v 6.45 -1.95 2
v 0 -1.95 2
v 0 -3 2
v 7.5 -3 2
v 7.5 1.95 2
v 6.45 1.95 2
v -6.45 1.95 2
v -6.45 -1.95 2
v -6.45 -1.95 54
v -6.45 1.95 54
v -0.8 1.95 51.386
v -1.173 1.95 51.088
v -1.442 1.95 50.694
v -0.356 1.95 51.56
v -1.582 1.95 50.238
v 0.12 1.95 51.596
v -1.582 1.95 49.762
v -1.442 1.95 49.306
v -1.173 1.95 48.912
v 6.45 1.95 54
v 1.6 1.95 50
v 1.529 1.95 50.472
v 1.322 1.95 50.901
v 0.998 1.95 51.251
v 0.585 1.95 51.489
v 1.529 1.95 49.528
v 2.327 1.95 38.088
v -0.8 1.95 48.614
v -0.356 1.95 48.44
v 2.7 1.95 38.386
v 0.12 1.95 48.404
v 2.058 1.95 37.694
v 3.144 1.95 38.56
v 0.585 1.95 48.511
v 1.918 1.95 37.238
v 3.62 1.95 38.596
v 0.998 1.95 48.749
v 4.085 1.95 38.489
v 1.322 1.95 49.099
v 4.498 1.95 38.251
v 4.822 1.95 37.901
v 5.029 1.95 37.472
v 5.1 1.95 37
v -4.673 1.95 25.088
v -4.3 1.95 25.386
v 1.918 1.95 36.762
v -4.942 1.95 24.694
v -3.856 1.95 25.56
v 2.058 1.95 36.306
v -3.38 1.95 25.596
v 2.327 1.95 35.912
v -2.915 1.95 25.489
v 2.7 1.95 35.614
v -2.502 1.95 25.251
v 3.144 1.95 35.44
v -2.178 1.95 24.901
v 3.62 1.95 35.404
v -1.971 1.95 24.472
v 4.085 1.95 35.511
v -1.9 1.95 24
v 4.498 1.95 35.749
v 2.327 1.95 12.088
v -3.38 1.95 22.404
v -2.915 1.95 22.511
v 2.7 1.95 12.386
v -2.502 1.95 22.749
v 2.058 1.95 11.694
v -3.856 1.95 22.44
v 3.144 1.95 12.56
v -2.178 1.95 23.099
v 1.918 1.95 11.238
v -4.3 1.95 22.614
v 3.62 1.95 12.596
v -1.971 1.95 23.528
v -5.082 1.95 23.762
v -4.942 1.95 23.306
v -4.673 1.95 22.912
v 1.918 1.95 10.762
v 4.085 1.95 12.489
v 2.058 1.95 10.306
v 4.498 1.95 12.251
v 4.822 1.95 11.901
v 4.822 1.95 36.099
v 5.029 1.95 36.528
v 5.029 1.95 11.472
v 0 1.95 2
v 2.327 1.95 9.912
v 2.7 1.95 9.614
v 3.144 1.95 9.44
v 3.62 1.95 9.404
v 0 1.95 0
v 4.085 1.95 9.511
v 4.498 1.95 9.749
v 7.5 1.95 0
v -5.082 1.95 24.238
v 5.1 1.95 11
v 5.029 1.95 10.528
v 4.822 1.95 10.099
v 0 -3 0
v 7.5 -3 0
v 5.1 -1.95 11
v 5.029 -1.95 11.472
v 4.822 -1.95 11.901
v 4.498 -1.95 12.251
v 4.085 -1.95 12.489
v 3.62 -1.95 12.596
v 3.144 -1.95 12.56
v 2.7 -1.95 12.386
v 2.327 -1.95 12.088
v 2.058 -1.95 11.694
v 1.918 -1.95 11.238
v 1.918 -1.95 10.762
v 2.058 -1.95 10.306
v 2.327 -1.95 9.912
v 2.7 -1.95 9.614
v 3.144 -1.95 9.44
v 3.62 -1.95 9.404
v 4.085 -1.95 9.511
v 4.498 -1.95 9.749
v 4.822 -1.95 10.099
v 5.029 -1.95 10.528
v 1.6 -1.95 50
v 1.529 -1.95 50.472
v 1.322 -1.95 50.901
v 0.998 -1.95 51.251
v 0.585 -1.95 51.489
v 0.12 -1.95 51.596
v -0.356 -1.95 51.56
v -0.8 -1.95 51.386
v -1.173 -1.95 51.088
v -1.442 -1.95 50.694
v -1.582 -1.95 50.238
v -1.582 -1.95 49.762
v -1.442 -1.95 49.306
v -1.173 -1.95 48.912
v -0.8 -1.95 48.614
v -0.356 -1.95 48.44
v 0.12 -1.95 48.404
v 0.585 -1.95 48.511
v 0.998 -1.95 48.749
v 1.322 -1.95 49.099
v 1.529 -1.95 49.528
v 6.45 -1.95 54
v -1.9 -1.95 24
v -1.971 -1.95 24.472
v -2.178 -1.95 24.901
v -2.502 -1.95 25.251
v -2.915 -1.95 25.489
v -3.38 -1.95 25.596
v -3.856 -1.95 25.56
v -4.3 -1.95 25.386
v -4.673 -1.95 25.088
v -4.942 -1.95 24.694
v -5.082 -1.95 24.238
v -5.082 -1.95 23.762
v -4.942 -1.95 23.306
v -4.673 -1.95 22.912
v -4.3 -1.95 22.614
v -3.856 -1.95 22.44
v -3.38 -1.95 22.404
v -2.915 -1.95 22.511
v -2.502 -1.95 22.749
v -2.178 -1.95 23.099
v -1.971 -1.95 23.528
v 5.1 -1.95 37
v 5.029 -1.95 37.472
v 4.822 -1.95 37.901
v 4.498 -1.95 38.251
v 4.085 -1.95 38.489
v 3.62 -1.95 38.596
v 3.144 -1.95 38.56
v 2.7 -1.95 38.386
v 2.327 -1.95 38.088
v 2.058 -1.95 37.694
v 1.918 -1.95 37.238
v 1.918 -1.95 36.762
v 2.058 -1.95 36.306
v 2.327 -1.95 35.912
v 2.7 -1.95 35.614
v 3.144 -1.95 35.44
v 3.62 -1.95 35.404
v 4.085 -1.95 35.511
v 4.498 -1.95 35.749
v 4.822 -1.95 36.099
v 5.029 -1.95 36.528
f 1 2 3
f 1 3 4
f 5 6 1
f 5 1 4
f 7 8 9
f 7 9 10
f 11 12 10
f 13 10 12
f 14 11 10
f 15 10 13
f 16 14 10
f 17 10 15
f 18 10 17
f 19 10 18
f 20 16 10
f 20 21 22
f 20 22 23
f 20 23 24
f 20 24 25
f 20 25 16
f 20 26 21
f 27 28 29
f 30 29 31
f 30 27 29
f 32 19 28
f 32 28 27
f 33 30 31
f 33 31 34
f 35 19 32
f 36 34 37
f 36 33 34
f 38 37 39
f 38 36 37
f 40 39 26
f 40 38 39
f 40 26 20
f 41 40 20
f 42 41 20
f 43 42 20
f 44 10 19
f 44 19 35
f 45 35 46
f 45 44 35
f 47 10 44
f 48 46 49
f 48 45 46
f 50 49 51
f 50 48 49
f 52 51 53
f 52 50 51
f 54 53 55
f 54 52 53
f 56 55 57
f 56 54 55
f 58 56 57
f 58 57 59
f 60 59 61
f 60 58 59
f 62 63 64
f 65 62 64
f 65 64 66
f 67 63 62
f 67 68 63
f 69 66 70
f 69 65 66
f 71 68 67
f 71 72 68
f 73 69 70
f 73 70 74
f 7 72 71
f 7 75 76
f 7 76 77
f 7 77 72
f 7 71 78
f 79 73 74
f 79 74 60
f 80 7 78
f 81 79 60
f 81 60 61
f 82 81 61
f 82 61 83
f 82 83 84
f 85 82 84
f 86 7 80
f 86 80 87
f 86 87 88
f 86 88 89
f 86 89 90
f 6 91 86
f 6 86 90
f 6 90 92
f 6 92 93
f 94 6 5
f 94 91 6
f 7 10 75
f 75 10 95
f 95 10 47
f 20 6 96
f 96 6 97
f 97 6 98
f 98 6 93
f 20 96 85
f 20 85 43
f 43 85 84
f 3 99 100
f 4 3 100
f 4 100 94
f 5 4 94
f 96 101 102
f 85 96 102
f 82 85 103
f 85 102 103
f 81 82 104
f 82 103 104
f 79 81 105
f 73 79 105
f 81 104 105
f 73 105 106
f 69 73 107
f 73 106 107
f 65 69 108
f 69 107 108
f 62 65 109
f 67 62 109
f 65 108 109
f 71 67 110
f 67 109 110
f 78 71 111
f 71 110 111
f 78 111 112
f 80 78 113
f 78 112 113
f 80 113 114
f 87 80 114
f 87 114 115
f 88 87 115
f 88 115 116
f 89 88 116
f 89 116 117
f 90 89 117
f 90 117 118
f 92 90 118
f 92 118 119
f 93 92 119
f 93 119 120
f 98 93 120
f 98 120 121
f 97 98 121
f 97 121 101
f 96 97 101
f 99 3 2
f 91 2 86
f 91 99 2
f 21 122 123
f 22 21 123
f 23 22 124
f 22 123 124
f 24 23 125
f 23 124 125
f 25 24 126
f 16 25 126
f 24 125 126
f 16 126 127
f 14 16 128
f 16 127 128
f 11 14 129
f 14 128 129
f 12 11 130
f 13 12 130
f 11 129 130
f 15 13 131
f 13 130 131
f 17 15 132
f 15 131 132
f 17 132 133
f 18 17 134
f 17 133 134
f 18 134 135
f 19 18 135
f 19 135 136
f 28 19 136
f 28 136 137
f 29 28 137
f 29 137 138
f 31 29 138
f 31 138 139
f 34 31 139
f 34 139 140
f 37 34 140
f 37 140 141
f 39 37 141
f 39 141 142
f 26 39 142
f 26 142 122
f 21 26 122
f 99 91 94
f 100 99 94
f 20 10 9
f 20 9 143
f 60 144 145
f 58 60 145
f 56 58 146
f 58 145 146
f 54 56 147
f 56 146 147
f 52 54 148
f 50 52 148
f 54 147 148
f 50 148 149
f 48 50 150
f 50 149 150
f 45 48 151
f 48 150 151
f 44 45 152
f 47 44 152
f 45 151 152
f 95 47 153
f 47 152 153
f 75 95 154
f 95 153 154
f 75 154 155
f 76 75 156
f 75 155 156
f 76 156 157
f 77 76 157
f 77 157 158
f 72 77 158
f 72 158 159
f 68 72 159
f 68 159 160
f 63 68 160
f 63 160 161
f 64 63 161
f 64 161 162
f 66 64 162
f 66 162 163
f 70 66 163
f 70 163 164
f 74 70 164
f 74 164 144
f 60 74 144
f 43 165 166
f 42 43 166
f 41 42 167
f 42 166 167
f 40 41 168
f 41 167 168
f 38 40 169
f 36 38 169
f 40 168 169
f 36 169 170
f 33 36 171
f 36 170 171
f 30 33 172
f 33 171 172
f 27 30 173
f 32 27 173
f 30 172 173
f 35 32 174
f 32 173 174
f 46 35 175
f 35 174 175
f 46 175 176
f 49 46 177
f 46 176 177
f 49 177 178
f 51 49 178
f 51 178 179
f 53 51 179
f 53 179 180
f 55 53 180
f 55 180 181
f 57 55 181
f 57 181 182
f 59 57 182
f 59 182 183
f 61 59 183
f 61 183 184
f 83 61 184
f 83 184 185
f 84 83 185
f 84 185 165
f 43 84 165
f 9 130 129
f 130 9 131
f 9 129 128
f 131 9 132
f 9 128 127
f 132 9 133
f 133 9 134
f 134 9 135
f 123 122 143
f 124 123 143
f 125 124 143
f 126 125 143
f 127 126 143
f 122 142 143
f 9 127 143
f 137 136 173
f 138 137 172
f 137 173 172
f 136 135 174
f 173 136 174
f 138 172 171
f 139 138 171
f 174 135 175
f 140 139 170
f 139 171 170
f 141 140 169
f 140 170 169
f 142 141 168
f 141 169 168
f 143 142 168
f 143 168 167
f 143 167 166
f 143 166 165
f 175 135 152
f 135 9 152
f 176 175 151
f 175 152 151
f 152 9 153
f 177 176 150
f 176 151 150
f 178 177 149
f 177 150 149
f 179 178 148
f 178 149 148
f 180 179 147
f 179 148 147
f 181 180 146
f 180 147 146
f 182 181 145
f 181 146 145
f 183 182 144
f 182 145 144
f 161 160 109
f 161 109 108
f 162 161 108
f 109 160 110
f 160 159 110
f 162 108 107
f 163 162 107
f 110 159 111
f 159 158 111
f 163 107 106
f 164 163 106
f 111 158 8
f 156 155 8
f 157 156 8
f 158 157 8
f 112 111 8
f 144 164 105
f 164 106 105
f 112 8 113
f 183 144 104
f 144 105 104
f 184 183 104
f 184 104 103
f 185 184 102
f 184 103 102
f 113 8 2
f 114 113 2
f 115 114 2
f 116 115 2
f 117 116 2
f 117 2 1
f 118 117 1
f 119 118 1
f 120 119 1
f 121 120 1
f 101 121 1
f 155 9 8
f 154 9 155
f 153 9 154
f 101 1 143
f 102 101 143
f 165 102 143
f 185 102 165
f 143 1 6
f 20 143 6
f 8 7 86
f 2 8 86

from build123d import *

# Parameters (mm, degrees)
SKETCH_1_W          = 7.5
SKETCH_1_H          = 6
EXTRUDE_1_DEPTH     = 2
SKETCH_2_W          = 12.9
SKETCH_2_H          = 3.9
EXTRUDE_2_DEPTH     = 52
SKETCH_3_R          = 1.6
CUT_EXTRUDE_1_DEPTH = 356
SKETCH_4_W          = 7.5
SKETCH_4_H          = 1.05
CUT_EXTRUDE_2_DEPTH = 10


with BuildPart() as part:
    # 草图1 → 凸台-拉伸1 (new body)
    with BuildSketch(Plane.XY):
        with Locations((3.75, 0)):
            Rectangle(SKETCH_1_W, SKETCH_1_H)
    extrude(amount=EXTRUDE_1_DEPTH)

    # 草图2 → 凸台-拉伸2 (add)
    with BuildSketch(Plane.XY.offset(2)):
        Rectangle(SKETCH_2_W, SKETCH_2_H)
    extrude(amount=EXTRUDE_2_DEPTH)

    # 草图3 → 切除-拉伸1 (cut)
    with BuildSketch(Plane.XZ.offset(1.95)):
        with Locations((3.5, 37)):
            Circle(SKETCH_3_R)
        with Locations((3.5, 11)):
            Circle(SKETCH_3_R)
        with Locations((-3.5, 24)):
            Circle(SKETCH_3_R)
        with Locations((0, 50)):
            Circle(SKETCH_3_R)
    extrude(amount=-CUT_EXTRUDE_1_DEPTH, mode=Mode.SUBTRACT)

    # 草图4 → 切除-拉伸2 (cut)
    with BuildSketch(Plane.XY.offset(2)):
        with Locations((3.75, 2.475)):
            Rectangle(SKETCH_4_W, SKETCH_4_H)
    extrude(amount=-CUT_EXTRUDE_2_DEPTH, mode=Mode.SUBTRACT)


solid = part.part
